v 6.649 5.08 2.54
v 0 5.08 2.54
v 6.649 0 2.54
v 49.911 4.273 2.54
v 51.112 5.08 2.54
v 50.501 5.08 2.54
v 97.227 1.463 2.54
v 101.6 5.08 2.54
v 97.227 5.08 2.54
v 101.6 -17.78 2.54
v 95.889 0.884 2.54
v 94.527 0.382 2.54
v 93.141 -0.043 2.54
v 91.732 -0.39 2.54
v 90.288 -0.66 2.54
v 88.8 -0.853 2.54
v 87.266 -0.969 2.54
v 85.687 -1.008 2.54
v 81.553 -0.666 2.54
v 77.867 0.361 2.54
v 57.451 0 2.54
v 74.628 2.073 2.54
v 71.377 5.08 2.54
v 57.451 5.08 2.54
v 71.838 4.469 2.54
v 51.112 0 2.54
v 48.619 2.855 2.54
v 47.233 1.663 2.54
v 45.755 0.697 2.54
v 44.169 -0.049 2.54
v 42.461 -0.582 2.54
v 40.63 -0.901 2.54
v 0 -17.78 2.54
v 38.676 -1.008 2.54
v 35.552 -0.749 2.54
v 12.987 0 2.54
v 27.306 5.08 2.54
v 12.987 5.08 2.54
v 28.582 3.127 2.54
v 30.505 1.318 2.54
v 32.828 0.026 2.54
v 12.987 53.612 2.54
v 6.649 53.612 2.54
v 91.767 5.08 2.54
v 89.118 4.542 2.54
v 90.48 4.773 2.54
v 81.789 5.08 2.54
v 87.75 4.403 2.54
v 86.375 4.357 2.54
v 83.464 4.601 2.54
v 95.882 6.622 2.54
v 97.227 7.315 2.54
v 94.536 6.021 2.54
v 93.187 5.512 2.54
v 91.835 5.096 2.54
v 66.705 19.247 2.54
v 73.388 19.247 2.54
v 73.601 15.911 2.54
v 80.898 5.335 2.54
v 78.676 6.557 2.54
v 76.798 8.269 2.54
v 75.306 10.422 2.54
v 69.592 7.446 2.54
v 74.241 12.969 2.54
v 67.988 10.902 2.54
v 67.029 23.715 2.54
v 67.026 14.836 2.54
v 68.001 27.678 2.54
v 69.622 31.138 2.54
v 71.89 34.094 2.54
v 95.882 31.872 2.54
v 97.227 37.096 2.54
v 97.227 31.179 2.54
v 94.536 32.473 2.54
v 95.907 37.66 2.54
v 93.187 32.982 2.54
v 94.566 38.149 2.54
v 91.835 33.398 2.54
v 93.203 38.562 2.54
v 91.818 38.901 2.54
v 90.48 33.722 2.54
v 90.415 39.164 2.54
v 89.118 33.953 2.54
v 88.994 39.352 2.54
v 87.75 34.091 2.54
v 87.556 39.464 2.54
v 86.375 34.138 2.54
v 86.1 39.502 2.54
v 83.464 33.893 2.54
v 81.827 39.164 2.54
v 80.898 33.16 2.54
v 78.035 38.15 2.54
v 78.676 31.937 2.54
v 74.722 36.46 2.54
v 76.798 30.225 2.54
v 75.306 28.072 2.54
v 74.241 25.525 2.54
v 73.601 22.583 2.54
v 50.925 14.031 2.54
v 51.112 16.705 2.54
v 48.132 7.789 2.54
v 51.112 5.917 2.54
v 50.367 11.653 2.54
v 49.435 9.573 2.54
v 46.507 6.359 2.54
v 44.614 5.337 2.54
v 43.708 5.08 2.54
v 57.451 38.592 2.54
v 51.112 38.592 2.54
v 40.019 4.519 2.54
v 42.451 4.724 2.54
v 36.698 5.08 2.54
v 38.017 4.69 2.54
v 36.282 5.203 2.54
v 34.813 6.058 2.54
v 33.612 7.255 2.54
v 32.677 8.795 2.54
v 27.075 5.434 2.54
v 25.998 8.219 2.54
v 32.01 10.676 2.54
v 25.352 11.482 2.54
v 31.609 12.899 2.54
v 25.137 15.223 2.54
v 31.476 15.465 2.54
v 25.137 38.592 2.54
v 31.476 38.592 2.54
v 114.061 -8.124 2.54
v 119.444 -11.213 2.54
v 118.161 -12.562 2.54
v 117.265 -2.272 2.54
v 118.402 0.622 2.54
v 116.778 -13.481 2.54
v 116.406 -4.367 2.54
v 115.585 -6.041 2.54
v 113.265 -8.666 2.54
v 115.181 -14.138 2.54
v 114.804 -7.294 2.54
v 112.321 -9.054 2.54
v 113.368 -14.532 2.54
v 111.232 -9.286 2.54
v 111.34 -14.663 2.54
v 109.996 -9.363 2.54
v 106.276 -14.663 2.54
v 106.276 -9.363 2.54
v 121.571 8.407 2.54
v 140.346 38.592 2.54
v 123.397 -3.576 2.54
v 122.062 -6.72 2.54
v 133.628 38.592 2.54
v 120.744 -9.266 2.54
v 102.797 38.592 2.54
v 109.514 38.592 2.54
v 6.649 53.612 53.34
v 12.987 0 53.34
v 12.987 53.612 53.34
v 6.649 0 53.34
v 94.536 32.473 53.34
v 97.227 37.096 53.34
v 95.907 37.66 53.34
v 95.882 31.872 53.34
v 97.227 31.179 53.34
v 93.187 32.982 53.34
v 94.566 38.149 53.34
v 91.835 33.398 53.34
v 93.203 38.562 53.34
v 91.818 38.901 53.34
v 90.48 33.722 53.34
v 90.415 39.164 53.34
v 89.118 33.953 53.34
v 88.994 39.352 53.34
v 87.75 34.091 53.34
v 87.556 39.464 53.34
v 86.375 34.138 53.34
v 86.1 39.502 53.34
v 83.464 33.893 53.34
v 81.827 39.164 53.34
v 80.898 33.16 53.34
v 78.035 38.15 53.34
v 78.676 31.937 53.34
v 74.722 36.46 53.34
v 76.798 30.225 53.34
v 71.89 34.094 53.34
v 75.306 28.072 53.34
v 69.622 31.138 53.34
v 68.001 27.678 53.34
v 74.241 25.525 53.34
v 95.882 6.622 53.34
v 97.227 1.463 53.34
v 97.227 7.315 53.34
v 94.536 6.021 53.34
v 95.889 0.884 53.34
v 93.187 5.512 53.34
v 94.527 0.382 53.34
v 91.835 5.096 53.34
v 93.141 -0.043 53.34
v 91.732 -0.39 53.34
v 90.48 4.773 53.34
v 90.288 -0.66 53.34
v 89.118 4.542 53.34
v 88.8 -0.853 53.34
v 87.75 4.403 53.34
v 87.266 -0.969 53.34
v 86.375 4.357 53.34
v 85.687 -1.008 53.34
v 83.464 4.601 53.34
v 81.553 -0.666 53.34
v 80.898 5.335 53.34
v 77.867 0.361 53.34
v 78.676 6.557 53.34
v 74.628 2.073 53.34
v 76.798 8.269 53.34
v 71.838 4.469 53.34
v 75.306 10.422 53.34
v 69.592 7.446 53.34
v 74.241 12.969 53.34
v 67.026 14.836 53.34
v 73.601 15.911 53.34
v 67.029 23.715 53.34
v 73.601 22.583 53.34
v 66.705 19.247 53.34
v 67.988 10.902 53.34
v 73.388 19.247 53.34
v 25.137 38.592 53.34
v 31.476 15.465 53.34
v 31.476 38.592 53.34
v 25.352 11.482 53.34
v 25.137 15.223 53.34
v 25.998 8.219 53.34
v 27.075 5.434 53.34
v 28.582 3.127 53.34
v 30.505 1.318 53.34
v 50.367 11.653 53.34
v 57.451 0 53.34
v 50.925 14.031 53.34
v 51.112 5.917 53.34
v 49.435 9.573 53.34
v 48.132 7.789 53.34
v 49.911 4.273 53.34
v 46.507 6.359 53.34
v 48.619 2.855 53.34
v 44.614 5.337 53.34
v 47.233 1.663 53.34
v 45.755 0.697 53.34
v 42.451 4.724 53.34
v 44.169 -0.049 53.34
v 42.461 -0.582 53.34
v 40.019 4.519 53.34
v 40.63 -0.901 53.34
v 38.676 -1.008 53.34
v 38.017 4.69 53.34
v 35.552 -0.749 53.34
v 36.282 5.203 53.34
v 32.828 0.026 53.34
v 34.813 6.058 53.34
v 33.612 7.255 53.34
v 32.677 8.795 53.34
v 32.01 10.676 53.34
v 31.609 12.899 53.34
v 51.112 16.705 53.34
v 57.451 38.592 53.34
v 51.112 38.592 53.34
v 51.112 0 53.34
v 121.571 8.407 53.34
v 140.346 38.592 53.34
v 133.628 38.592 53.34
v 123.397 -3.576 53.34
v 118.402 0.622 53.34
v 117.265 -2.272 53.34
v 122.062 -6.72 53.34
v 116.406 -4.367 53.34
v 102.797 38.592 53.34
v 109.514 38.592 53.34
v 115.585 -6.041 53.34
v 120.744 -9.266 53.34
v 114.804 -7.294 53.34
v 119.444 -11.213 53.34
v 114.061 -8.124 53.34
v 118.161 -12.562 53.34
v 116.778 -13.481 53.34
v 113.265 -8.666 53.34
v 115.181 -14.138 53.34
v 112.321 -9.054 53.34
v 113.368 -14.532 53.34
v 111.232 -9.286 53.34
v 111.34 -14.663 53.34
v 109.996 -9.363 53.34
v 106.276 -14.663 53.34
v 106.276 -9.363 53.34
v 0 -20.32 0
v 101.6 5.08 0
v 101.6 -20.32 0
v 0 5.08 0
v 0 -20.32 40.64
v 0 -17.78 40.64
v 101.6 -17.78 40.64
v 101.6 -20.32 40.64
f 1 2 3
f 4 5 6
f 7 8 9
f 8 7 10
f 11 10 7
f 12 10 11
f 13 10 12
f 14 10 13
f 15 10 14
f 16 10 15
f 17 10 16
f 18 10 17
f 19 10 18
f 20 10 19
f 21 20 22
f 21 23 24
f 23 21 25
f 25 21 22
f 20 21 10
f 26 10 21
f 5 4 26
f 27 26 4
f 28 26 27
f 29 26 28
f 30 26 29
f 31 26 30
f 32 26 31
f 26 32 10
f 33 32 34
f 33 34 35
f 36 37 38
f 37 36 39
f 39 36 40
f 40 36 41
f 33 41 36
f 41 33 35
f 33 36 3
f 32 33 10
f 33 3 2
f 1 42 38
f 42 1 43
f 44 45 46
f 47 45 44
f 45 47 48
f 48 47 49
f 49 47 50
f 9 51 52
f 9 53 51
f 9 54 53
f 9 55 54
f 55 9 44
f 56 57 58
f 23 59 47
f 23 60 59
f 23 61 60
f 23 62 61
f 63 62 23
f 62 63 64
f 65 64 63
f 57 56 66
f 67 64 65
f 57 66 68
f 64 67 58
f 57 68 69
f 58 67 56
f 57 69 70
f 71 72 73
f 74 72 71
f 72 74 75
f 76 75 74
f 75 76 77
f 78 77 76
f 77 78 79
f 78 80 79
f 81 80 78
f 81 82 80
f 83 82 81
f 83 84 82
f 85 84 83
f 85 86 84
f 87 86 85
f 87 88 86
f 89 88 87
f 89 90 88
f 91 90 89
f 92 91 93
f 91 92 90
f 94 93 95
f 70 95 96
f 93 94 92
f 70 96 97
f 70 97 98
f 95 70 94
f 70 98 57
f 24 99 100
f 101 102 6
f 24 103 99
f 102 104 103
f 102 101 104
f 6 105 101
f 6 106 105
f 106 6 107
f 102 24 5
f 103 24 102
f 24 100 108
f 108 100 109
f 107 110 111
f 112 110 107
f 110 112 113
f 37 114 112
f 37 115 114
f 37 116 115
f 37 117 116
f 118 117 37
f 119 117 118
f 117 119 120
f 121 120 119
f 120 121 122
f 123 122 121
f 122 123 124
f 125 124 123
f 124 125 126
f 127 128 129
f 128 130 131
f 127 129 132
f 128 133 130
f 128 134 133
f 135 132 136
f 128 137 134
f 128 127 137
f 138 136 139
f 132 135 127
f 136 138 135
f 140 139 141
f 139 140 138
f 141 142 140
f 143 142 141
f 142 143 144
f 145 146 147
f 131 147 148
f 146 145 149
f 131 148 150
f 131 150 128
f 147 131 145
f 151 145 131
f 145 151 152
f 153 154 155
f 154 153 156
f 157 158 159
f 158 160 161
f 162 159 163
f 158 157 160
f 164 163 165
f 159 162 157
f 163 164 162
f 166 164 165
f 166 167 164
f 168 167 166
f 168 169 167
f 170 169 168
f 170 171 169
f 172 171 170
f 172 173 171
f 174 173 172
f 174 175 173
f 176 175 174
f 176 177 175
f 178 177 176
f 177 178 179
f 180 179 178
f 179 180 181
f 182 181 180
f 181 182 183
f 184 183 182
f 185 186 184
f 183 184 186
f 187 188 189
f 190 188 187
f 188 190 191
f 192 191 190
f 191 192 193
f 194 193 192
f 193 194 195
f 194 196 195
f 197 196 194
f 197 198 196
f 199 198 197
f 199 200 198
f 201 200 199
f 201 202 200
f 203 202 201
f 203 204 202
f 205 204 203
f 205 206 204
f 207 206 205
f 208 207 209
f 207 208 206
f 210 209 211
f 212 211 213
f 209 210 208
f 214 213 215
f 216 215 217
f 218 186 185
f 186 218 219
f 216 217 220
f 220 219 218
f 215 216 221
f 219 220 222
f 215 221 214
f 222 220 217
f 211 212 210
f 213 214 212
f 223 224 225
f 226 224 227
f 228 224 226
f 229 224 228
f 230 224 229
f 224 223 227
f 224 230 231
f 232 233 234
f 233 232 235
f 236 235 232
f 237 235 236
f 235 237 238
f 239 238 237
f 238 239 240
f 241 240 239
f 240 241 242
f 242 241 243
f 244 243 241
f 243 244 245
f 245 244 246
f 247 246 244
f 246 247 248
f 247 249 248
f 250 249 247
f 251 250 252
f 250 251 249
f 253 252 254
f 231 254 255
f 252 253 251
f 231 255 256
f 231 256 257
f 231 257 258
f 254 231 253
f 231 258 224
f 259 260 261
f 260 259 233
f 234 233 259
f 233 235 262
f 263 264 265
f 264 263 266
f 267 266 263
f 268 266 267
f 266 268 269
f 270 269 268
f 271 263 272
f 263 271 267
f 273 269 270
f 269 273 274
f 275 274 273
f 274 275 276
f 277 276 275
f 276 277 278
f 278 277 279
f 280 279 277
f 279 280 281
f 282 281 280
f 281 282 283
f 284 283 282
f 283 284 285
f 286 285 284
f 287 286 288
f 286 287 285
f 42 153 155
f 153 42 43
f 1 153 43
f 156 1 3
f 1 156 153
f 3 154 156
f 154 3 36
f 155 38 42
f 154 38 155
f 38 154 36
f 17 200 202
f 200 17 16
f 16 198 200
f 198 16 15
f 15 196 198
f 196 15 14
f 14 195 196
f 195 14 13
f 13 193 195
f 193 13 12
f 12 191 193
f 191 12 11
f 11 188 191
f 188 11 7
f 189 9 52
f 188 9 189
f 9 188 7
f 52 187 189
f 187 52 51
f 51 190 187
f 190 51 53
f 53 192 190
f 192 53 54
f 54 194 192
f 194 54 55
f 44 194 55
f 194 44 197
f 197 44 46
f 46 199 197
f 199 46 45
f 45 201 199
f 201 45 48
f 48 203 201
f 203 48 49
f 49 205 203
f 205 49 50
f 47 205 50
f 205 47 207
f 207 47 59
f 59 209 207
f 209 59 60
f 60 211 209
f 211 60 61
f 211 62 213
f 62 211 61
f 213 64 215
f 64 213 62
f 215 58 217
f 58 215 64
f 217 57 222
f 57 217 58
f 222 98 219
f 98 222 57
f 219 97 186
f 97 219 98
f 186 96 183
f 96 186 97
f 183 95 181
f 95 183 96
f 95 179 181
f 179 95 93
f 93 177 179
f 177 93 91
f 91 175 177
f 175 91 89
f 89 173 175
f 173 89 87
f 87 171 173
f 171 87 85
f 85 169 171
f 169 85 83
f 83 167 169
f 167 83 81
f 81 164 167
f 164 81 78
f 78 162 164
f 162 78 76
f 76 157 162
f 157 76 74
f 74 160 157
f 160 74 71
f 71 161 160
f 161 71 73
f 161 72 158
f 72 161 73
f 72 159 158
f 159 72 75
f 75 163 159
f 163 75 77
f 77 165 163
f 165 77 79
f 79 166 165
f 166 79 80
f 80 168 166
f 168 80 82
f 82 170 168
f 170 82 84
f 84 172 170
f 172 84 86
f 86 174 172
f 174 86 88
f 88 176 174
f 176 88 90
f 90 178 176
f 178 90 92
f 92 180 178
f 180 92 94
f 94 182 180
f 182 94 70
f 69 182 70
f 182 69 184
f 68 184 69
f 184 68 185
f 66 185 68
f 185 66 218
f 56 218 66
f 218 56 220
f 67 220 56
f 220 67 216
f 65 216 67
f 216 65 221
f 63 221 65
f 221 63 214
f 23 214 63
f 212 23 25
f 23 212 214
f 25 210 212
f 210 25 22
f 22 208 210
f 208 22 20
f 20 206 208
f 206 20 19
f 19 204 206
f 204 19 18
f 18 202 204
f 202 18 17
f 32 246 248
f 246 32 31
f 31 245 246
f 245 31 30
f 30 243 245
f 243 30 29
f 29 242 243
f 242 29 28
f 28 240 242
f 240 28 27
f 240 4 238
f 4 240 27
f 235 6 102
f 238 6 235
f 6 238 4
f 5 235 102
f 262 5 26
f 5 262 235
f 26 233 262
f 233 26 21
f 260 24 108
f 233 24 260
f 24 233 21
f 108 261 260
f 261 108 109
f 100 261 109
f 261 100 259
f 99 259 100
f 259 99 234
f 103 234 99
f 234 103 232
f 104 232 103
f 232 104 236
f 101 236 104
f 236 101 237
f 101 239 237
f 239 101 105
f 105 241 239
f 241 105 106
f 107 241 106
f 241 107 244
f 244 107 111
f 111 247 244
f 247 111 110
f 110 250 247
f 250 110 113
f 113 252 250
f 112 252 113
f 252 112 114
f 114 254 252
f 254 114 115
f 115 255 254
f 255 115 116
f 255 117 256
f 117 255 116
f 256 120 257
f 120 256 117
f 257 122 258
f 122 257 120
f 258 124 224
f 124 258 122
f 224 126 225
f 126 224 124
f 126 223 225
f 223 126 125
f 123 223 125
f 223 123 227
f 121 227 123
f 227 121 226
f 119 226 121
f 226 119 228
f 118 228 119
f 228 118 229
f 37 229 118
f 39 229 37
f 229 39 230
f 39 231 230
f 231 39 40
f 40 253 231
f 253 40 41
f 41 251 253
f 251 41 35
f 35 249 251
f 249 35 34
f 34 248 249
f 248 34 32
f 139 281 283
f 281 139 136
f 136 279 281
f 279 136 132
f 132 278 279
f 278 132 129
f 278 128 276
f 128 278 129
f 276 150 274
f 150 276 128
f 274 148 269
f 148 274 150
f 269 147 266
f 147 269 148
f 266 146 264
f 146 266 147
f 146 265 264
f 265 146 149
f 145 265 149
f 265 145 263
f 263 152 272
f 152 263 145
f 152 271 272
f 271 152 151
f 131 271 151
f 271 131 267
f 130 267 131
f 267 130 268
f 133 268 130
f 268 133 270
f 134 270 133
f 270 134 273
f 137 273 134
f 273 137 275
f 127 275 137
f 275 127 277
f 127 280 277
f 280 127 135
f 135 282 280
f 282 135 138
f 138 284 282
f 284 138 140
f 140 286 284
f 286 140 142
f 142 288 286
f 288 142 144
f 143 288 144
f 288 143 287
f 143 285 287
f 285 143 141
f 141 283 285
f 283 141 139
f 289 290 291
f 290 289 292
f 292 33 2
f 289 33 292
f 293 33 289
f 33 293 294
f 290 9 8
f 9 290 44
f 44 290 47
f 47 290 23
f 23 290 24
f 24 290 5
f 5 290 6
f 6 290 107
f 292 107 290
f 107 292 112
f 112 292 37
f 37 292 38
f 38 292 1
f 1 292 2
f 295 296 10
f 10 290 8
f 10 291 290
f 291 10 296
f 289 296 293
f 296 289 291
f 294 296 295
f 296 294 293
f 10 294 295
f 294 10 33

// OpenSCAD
ViewScale = [0.0254, 0.0254, 0.0254];

module lucy()
{
    translate([0, 0, 100])
   linear_extrude(2000)
    text("lucy", font="curlz MT", size=2000, spacing=1);

    linear_extrude(100)
    translate([0, -800, 0])
    square([4000, 1000]);

    linear_extrude(1600)
    translate([0, -800, 0])
    square([4000, 100]);

}

scale(ViewScale)
{
    lucy();
}
